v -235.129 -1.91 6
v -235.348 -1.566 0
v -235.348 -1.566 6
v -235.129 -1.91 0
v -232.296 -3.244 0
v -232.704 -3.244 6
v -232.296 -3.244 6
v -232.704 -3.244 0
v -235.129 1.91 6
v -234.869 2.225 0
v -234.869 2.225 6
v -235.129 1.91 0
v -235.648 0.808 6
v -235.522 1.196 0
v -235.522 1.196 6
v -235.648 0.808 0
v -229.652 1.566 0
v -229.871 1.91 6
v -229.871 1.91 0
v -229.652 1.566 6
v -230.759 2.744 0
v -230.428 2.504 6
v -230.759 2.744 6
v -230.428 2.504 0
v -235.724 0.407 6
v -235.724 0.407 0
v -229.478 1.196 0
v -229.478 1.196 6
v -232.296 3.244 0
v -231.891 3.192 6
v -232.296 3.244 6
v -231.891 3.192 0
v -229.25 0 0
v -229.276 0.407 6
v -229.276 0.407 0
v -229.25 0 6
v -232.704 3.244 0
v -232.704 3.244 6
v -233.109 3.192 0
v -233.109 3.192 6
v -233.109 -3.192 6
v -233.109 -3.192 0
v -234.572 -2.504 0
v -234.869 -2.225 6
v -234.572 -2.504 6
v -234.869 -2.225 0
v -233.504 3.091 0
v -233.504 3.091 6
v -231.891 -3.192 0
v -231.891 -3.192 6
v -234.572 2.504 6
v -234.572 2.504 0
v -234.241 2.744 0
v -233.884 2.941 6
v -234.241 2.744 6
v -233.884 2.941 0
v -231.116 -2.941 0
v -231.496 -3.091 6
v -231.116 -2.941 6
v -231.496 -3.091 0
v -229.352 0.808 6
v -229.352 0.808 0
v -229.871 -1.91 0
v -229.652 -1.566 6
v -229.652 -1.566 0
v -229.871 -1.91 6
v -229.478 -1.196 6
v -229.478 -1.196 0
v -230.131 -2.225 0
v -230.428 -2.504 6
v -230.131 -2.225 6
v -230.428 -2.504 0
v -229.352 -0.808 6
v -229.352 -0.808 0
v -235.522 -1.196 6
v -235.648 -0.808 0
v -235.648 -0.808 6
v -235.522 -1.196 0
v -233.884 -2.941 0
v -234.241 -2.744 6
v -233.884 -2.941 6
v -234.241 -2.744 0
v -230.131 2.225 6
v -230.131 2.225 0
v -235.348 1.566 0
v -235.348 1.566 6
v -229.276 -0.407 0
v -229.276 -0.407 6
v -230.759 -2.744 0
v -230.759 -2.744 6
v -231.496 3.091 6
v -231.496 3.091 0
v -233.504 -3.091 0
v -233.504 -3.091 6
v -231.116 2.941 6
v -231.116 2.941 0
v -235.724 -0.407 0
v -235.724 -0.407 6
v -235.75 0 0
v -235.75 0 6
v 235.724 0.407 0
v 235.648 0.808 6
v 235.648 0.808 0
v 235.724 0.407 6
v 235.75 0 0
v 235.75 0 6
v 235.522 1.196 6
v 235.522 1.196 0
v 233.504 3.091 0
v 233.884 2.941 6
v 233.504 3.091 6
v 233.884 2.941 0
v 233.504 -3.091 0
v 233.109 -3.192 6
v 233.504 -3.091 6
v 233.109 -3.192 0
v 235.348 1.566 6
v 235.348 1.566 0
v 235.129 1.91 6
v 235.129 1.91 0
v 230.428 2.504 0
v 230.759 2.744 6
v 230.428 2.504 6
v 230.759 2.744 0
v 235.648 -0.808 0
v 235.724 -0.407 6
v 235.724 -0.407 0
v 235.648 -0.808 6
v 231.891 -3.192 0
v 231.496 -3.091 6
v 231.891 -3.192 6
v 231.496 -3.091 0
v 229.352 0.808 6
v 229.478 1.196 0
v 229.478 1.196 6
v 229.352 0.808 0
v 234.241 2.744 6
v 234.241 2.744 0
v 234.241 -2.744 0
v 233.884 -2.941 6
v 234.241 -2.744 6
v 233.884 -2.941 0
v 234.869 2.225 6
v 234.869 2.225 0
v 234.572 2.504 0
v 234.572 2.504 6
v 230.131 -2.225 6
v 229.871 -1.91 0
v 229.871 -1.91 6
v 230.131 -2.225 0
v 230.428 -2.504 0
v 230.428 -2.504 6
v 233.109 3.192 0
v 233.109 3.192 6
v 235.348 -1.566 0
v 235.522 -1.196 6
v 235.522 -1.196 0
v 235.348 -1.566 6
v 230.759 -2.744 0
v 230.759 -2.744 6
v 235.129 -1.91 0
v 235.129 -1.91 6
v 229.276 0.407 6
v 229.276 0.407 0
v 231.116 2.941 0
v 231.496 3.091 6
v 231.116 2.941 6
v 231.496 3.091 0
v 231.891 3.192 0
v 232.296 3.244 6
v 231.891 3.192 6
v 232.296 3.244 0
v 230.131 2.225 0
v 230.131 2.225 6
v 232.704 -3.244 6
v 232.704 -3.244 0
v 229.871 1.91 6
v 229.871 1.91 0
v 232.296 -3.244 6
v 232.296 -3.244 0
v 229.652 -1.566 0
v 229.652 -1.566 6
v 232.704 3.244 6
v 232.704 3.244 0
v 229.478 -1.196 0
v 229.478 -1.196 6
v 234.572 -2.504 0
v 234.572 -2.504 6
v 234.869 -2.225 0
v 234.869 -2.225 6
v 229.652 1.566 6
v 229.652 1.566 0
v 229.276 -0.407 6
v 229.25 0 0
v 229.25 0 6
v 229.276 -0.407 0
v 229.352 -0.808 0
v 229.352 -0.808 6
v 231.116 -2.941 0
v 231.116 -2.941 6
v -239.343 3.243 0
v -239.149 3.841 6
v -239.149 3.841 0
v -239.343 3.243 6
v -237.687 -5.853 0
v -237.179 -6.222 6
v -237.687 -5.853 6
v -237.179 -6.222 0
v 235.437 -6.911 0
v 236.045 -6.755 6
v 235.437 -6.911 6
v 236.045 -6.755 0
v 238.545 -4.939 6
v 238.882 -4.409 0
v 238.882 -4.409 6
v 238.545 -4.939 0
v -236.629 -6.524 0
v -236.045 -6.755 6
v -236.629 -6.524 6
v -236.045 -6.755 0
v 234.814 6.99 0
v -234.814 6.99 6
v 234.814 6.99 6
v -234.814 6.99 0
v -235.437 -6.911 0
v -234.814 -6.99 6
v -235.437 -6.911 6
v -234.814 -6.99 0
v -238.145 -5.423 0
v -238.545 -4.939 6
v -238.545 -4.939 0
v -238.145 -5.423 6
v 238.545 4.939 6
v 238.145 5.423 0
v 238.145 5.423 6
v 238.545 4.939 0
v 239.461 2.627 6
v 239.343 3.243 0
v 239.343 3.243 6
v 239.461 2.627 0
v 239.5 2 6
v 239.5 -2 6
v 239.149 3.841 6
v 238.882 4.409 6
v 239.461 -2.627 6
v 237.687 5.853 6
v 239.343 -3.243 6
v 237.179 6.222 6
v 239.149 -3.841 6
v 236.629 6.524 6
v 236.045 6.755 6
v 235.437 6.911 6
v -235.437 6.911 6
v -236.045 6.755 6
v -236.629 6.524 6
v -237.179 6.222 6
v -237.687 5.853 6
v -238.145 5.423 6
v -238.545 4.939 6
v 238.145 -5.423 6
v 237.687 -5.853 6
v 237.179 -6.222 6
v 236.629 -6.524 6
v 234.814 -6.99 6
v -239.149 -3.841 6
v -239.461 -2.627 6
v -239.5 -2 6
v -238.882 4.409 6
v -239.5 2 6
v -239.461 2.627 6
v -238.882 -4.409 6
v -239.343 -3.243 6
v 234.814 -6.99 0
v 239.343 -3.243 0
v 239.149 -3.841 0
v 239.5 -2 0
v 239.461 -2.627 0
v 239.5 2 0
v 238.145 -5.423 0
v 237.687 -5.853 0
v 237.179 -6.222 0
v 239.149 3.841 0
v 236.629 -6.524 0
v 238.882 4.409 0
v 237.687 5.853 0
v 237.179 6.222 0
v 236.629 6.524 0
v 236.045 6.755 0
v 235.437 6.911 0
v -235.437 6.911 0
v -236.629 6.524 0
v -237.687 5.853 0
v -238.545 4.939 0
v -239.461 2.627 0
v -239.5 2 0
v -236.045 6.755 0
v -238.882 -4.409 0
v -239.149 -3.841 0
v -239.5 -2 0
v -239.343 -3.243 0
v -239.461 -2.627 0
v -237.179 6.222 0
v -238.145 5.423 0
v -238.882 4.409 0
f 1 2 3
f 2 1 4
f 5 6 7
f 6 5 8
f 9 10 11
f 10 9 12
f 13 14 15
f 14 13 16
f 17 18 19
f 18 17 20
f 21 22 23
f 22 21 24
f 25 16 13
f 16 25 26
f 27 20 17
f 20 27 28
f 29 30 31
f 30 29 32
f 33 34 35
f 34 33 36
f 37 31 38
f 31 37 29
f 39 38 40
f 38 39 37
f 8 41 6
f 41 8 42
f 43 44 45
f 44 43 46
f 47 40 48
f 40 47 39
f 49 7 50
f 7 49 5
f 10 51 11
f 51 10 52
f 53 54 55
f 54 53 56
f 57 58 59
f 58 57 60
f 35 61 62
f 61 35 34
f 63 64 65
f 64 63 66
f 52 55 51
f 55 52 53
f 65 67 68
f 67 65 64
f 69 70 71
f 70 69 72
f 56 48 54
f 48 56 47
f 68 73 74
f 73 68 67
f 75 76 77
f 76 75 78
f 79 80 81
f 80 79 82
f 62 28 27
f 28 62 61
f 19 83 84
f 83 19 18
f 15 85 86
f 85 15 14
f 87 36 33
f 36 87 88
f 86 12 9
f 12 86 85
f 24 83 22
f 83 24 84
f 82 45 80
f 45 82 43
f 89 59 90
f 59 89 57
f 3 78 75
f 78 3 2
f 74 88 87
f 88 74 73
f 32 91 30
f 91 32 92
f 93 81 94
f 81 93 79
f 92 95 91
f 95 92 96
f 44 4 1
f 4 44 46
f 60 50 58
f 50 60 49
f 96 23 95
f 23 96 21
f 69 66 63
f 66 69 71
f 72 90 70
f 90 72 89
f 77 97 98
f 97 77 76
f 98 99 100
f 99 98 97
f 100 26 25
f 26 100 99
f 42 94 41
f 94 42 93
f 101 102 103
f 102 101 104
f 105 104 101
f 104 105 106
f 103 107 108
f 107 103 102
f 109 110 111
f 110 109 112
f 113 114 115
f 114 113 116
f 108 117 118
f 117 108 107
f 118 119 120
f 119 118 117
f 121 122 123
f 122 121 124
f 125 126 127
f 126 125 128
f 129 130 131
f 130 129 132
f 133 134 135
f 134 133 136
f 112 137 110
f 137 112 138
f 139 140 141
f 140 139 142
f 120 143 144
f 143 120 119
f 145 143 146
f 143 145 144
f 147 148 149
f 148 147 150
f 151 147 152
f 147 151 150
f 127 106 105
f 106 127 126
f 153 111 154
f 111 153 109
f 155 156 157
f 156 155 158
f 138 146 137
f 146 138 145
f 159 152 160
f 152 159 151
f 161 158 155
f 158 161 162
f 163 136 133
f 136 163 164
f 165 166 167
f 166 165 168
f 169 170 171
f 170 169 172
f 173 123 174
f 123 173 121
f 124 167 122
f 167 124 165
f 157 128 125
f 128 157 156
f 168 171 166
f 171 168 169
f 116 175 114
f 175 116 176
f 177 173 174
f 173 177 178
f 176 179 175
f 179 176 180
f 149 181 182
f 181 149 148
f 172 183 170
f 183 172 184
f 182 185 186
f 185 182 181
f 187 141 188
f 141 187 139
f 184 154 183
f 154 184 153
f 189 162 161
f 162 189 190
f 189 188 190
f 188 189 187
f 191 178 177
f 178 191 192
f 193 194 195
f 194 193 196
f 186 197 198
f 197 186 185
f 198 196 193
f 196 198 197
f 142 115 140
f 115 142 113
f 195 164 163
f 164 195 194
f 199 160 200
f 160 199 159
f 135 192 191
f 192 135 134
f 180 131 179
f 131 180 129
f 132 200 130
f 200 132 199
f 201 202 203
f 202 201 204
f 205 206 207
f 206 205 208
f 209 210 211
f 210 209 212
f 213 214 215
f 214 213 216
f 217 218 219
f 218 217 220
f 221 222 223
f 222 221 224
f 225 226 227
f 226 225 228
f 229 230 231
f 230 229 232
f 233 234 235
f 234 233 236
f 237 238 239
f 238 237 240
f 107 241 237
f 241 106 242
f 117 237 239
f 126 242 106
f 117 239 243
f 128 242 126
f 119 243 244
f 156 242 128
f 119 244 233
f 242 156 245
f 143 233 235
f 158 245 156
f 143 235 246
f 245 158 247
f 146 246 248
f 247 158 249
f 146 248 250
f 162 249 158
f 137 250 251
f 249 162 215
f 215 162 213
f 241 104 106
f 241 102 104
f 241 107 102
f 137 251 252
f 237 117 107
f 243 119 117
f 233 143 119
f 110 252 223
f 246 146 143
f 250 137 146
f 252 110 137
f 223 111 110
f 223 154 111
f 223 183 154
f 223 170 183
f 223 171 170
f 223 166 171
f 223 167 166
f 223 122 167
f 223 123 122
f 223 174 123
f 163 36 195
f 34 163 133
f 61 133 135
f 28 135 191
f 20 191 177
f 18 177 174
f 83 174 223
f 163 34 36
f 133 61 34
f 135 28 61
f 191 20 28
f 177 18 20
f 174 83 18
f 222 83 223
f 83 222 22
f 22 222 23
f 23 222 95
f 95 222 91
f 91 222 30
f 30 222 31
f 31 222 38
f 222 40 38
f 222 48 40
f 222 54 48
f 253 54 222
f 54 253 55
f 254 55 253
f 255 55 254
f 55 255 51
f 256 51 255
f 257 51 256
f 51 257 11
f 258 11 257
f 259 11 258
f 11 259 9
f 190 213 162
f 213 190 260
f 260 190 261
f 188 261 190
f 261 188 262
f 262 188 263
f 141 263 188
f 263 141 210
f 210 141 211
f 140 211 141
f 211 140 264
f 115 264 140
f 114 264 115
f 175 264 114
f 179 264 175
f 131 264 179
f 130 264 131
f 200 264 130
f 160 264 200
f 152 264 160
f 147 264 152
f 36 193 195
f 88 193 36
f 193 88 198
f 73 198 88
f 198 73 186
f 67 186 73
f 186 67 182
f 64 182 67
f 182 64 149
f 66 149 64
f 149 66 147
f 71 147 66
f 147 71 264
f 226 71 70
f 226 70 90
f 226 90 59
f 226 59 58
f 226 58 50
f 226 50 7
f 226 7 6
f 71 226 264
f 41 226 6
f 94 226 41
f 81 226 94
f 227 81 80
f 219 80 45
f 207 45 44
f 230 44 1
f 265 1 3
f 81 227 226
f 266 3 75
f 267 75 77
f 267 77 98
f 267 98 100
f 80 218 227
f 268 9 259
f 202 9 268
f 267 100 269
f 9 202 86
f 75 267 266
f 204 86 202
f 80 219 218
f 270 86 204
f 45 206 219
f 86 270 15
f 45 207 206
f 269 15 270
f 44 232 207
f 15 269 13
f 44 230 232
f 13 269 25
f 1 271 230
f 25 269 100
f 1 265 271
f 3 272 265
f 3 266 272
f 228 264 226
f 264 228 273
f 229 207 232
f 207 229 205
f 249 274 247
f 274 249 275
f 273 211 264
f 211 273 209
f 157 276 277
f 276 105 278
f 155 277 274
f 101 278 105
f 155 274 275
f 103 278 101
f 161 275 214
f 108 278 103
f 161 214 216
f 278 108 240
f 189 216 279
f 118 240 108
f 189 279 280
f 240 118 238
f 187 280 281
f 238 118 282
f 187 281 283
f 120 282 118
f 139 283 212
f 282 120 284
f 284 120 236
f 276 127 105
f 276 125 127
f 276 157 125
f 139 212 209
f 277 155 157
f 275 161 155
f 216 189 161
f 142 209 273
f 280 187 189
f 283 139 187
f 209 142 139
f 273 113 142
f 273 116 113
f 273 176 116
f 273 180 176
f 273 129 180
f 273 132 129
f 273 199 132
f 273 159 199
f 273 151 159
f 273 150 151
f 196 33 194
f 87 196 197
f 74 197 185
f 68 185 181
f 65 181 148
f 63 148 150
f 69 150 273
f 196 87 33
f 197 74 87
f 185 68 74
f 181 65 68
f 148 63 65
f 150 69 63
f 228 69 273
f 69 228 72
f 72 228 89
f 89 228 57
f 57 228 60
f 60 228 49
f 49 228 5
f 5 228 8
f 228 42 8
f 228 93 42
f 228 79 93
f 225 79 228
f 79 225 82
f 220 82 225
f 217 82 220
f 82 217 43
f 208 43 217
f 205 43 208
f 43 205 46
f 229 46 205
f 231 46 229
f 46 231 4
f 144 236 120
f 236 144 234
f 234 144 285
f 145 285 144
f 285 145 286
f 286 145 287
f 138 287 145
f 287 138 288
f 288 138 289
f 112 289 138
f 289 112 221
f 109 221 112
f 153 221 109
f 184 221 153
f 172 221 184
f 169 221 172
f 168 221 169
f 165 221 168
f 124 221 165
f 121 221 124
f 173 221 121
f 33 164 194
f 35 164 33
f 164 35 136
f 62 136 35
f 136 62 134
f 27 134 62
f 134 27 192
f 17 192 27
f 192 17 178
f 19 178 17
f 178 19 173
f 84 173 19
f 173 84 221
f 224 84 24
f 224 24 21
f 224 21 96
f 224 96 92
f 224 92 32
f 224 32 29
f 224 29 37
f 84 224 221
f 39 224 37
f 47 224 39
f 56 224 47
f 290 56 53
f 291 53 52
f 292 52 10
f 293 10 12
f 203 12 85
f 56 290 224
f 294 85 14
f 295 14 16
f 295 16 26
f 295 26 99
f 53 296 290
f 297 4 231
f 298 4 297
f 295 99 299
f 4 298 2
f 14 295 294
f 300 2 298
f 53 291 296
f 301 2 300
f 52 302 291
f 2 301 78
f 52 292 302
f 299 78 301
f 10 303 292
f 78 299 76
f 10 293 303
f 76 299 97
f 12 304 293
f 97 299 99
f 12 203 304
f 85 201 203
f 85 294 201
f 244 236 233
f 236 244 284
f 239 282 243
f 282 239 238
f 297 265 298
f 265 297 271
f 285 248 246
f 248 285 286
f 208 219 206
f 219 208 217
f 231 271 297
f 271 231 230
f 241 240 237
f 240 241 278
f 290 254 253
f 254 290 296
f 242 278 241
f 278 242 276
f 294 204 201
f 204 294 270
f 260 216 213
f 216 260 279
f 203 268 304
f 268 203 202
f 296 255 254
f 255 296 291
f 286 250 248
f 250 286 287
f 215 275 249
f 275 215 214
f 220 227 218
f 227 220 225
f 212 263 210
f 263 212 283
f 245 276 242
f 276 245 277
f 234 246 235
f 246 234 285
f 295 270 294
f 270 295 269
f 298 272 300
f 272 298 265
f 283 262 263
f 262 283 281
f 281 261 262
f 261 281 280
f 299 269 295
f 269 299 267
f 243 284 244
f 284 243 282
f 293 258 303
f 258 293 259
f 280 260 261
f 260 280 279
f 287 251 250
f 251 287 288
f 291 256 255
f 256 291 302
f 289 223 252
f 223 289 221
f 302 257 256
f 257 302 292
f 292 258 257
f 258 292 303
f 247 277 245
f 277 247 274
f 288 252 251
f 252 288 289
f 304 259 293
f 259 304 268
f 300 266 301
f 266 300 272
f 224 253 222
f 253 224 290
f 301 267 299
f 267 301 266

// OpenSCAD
$fn = 50;


difference() {
	union() {
		hull() {
			translate(v = [-234.5000000000, 2.0000000000, 0]) {
				cylinder(h = 6, r = 5);
			}
			translate(v = [234.5000000000, 2.0000000000, 0]) {
				cylinder(h = 6, r = 5);
			}
			translate(v = [-234.5000000000, -2.0000000000, 0]) {
				cylinder(h = 6, r = 5);
			}
			translate(v = [234.5000000000, -2.0000000000, 0]) {
				cylinder(h = 6, r = 5);
			}
		}
	}
	union() {
		translate(v = [-232.5000000000, 0.0000000000, -100.0000000000]) {
			cylinder(h = 200, r = 3.2500000000);
		}
		translate(v = [-232.5000000000, 0.0000000000, -100.0000000000]) {
			cylinder(h = 200, r = 3.2500000000);
		}
		translate(v = [232.5000000000, 0.0000000000, -100.0000000000]) {
			cylinder(h = 200, r = 3.2500000000);
		}
		translate(v = [232.5000000000, 0.0000000000, -100.0000000000]) {
			cylinder(h = 200, r = 3.2500000000);
		}
	}
}
